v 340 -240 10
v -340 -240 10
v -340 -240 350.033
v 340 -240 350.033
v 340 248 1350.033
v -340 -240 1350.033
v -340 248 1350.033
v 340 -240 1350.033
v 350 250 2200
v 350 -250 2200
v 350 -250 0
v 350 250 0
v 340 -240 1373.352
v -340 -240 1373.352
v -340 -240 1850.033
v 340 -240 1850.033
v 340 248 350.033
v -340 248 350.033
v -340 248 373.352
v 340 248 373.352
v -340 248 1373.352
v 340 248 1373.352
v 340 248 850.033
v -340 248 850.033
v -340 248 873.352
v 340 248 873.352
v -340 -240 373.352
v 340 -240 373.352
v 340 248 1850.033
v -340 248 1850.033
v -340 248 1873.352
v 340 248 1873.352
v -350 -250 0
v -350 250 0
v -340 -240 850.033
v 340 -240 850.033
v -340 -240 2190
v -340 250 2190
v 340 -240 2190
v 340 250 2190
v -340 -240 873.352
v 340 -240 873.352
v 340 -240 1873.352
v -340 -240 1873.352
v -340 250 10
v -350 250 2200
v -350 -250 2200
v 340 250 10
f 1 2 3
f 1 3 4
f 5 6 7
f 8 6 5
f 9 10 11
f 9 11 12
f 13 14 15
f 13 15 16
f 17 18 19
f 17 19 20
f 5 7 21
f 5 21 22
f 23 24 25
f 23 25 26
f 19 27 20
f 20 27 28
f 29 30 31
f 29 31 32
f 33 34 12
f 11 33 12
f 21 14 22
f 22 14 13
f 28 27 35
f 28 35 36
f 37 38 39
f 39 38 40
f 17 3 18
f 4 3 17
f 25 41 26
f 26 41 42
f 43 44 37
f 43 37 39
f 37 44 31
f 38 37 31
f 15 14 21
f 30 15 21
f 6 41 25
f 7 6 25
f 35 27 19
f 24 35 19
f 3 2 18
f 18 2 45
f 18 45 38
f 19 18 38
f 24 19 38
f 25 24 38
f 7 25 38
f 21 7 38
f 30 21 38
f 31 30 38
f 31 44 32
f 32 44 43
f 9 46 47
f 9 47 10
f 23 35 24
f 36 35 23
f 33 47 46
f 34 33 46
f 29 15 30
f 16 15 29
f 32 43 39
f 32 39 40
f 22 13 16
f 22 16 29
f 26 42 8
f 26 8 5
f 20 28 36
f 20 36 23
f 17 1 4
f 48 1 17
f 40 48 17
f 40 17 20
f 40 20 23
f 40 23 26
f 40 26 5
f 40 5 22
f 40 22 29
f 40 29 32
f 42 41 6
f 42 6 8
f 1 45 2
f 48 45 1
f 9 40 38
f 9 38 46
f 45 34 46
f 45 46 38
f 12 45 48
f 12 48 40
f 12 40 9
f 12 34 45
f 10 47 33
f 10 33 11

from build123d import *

# Parameters (mm, degrees)
CROQUIS1_W              = 700
CROQUIS1_H              = 500
SALIENTE_EXTRUIR1_DEPTH = 2200
VACIADO1_T              = -10
CROQUIS2_W              = 680
CROQUIS2_H              = 23.319411046
SALIENTE_EXTRUIR2_DEPTH = 488
MATRIZL1_COUNT          = 4
MATRIZL1_PITCH          = 500


with BuildPart() as part:
    # Croquis1 → Saliente-Extruir1 (new body)
    with BuildSketch(Plane.XY):
        Rectangle(CROQUIS1_W, CROQUIS1_H)
    extrude(amount=SALIENTE_EXTRUIR1_DEPTH)

    # Vaciado1
    vaciado1_openings = [part.faces().sort_by_distance(p)[0] for p in [
        (0, 250, 1100),
    ]]
    offset(amount=VACIADO1_T, openings=vaciado1_openings, kind=Kind.INTERSECTION)

    # Croquis2 → Saliente-Extruir2 (add)
    with BuildSketch(Plane(origin=(0, -240, 0), x_dir=(1, 0, 0), z_dir=(0, 1, 0))):
        with Locations((0, -361.692736208)):
            Rectangle(CROQUIS2_W, CROQUIS2_H)
    saliente_extruir2 = extrude(amount=SALIENTE_EXTRUIR2_DEPTH)

    # MatrizL1: Saliente-Extruir2 ×4
    with Locations(*[(0, 0, i * MATRIZL1_PITCH) for i in range(1, MATRIZL1_COUNT)]):
        add(saliente_extruir2)


solid = part.part
